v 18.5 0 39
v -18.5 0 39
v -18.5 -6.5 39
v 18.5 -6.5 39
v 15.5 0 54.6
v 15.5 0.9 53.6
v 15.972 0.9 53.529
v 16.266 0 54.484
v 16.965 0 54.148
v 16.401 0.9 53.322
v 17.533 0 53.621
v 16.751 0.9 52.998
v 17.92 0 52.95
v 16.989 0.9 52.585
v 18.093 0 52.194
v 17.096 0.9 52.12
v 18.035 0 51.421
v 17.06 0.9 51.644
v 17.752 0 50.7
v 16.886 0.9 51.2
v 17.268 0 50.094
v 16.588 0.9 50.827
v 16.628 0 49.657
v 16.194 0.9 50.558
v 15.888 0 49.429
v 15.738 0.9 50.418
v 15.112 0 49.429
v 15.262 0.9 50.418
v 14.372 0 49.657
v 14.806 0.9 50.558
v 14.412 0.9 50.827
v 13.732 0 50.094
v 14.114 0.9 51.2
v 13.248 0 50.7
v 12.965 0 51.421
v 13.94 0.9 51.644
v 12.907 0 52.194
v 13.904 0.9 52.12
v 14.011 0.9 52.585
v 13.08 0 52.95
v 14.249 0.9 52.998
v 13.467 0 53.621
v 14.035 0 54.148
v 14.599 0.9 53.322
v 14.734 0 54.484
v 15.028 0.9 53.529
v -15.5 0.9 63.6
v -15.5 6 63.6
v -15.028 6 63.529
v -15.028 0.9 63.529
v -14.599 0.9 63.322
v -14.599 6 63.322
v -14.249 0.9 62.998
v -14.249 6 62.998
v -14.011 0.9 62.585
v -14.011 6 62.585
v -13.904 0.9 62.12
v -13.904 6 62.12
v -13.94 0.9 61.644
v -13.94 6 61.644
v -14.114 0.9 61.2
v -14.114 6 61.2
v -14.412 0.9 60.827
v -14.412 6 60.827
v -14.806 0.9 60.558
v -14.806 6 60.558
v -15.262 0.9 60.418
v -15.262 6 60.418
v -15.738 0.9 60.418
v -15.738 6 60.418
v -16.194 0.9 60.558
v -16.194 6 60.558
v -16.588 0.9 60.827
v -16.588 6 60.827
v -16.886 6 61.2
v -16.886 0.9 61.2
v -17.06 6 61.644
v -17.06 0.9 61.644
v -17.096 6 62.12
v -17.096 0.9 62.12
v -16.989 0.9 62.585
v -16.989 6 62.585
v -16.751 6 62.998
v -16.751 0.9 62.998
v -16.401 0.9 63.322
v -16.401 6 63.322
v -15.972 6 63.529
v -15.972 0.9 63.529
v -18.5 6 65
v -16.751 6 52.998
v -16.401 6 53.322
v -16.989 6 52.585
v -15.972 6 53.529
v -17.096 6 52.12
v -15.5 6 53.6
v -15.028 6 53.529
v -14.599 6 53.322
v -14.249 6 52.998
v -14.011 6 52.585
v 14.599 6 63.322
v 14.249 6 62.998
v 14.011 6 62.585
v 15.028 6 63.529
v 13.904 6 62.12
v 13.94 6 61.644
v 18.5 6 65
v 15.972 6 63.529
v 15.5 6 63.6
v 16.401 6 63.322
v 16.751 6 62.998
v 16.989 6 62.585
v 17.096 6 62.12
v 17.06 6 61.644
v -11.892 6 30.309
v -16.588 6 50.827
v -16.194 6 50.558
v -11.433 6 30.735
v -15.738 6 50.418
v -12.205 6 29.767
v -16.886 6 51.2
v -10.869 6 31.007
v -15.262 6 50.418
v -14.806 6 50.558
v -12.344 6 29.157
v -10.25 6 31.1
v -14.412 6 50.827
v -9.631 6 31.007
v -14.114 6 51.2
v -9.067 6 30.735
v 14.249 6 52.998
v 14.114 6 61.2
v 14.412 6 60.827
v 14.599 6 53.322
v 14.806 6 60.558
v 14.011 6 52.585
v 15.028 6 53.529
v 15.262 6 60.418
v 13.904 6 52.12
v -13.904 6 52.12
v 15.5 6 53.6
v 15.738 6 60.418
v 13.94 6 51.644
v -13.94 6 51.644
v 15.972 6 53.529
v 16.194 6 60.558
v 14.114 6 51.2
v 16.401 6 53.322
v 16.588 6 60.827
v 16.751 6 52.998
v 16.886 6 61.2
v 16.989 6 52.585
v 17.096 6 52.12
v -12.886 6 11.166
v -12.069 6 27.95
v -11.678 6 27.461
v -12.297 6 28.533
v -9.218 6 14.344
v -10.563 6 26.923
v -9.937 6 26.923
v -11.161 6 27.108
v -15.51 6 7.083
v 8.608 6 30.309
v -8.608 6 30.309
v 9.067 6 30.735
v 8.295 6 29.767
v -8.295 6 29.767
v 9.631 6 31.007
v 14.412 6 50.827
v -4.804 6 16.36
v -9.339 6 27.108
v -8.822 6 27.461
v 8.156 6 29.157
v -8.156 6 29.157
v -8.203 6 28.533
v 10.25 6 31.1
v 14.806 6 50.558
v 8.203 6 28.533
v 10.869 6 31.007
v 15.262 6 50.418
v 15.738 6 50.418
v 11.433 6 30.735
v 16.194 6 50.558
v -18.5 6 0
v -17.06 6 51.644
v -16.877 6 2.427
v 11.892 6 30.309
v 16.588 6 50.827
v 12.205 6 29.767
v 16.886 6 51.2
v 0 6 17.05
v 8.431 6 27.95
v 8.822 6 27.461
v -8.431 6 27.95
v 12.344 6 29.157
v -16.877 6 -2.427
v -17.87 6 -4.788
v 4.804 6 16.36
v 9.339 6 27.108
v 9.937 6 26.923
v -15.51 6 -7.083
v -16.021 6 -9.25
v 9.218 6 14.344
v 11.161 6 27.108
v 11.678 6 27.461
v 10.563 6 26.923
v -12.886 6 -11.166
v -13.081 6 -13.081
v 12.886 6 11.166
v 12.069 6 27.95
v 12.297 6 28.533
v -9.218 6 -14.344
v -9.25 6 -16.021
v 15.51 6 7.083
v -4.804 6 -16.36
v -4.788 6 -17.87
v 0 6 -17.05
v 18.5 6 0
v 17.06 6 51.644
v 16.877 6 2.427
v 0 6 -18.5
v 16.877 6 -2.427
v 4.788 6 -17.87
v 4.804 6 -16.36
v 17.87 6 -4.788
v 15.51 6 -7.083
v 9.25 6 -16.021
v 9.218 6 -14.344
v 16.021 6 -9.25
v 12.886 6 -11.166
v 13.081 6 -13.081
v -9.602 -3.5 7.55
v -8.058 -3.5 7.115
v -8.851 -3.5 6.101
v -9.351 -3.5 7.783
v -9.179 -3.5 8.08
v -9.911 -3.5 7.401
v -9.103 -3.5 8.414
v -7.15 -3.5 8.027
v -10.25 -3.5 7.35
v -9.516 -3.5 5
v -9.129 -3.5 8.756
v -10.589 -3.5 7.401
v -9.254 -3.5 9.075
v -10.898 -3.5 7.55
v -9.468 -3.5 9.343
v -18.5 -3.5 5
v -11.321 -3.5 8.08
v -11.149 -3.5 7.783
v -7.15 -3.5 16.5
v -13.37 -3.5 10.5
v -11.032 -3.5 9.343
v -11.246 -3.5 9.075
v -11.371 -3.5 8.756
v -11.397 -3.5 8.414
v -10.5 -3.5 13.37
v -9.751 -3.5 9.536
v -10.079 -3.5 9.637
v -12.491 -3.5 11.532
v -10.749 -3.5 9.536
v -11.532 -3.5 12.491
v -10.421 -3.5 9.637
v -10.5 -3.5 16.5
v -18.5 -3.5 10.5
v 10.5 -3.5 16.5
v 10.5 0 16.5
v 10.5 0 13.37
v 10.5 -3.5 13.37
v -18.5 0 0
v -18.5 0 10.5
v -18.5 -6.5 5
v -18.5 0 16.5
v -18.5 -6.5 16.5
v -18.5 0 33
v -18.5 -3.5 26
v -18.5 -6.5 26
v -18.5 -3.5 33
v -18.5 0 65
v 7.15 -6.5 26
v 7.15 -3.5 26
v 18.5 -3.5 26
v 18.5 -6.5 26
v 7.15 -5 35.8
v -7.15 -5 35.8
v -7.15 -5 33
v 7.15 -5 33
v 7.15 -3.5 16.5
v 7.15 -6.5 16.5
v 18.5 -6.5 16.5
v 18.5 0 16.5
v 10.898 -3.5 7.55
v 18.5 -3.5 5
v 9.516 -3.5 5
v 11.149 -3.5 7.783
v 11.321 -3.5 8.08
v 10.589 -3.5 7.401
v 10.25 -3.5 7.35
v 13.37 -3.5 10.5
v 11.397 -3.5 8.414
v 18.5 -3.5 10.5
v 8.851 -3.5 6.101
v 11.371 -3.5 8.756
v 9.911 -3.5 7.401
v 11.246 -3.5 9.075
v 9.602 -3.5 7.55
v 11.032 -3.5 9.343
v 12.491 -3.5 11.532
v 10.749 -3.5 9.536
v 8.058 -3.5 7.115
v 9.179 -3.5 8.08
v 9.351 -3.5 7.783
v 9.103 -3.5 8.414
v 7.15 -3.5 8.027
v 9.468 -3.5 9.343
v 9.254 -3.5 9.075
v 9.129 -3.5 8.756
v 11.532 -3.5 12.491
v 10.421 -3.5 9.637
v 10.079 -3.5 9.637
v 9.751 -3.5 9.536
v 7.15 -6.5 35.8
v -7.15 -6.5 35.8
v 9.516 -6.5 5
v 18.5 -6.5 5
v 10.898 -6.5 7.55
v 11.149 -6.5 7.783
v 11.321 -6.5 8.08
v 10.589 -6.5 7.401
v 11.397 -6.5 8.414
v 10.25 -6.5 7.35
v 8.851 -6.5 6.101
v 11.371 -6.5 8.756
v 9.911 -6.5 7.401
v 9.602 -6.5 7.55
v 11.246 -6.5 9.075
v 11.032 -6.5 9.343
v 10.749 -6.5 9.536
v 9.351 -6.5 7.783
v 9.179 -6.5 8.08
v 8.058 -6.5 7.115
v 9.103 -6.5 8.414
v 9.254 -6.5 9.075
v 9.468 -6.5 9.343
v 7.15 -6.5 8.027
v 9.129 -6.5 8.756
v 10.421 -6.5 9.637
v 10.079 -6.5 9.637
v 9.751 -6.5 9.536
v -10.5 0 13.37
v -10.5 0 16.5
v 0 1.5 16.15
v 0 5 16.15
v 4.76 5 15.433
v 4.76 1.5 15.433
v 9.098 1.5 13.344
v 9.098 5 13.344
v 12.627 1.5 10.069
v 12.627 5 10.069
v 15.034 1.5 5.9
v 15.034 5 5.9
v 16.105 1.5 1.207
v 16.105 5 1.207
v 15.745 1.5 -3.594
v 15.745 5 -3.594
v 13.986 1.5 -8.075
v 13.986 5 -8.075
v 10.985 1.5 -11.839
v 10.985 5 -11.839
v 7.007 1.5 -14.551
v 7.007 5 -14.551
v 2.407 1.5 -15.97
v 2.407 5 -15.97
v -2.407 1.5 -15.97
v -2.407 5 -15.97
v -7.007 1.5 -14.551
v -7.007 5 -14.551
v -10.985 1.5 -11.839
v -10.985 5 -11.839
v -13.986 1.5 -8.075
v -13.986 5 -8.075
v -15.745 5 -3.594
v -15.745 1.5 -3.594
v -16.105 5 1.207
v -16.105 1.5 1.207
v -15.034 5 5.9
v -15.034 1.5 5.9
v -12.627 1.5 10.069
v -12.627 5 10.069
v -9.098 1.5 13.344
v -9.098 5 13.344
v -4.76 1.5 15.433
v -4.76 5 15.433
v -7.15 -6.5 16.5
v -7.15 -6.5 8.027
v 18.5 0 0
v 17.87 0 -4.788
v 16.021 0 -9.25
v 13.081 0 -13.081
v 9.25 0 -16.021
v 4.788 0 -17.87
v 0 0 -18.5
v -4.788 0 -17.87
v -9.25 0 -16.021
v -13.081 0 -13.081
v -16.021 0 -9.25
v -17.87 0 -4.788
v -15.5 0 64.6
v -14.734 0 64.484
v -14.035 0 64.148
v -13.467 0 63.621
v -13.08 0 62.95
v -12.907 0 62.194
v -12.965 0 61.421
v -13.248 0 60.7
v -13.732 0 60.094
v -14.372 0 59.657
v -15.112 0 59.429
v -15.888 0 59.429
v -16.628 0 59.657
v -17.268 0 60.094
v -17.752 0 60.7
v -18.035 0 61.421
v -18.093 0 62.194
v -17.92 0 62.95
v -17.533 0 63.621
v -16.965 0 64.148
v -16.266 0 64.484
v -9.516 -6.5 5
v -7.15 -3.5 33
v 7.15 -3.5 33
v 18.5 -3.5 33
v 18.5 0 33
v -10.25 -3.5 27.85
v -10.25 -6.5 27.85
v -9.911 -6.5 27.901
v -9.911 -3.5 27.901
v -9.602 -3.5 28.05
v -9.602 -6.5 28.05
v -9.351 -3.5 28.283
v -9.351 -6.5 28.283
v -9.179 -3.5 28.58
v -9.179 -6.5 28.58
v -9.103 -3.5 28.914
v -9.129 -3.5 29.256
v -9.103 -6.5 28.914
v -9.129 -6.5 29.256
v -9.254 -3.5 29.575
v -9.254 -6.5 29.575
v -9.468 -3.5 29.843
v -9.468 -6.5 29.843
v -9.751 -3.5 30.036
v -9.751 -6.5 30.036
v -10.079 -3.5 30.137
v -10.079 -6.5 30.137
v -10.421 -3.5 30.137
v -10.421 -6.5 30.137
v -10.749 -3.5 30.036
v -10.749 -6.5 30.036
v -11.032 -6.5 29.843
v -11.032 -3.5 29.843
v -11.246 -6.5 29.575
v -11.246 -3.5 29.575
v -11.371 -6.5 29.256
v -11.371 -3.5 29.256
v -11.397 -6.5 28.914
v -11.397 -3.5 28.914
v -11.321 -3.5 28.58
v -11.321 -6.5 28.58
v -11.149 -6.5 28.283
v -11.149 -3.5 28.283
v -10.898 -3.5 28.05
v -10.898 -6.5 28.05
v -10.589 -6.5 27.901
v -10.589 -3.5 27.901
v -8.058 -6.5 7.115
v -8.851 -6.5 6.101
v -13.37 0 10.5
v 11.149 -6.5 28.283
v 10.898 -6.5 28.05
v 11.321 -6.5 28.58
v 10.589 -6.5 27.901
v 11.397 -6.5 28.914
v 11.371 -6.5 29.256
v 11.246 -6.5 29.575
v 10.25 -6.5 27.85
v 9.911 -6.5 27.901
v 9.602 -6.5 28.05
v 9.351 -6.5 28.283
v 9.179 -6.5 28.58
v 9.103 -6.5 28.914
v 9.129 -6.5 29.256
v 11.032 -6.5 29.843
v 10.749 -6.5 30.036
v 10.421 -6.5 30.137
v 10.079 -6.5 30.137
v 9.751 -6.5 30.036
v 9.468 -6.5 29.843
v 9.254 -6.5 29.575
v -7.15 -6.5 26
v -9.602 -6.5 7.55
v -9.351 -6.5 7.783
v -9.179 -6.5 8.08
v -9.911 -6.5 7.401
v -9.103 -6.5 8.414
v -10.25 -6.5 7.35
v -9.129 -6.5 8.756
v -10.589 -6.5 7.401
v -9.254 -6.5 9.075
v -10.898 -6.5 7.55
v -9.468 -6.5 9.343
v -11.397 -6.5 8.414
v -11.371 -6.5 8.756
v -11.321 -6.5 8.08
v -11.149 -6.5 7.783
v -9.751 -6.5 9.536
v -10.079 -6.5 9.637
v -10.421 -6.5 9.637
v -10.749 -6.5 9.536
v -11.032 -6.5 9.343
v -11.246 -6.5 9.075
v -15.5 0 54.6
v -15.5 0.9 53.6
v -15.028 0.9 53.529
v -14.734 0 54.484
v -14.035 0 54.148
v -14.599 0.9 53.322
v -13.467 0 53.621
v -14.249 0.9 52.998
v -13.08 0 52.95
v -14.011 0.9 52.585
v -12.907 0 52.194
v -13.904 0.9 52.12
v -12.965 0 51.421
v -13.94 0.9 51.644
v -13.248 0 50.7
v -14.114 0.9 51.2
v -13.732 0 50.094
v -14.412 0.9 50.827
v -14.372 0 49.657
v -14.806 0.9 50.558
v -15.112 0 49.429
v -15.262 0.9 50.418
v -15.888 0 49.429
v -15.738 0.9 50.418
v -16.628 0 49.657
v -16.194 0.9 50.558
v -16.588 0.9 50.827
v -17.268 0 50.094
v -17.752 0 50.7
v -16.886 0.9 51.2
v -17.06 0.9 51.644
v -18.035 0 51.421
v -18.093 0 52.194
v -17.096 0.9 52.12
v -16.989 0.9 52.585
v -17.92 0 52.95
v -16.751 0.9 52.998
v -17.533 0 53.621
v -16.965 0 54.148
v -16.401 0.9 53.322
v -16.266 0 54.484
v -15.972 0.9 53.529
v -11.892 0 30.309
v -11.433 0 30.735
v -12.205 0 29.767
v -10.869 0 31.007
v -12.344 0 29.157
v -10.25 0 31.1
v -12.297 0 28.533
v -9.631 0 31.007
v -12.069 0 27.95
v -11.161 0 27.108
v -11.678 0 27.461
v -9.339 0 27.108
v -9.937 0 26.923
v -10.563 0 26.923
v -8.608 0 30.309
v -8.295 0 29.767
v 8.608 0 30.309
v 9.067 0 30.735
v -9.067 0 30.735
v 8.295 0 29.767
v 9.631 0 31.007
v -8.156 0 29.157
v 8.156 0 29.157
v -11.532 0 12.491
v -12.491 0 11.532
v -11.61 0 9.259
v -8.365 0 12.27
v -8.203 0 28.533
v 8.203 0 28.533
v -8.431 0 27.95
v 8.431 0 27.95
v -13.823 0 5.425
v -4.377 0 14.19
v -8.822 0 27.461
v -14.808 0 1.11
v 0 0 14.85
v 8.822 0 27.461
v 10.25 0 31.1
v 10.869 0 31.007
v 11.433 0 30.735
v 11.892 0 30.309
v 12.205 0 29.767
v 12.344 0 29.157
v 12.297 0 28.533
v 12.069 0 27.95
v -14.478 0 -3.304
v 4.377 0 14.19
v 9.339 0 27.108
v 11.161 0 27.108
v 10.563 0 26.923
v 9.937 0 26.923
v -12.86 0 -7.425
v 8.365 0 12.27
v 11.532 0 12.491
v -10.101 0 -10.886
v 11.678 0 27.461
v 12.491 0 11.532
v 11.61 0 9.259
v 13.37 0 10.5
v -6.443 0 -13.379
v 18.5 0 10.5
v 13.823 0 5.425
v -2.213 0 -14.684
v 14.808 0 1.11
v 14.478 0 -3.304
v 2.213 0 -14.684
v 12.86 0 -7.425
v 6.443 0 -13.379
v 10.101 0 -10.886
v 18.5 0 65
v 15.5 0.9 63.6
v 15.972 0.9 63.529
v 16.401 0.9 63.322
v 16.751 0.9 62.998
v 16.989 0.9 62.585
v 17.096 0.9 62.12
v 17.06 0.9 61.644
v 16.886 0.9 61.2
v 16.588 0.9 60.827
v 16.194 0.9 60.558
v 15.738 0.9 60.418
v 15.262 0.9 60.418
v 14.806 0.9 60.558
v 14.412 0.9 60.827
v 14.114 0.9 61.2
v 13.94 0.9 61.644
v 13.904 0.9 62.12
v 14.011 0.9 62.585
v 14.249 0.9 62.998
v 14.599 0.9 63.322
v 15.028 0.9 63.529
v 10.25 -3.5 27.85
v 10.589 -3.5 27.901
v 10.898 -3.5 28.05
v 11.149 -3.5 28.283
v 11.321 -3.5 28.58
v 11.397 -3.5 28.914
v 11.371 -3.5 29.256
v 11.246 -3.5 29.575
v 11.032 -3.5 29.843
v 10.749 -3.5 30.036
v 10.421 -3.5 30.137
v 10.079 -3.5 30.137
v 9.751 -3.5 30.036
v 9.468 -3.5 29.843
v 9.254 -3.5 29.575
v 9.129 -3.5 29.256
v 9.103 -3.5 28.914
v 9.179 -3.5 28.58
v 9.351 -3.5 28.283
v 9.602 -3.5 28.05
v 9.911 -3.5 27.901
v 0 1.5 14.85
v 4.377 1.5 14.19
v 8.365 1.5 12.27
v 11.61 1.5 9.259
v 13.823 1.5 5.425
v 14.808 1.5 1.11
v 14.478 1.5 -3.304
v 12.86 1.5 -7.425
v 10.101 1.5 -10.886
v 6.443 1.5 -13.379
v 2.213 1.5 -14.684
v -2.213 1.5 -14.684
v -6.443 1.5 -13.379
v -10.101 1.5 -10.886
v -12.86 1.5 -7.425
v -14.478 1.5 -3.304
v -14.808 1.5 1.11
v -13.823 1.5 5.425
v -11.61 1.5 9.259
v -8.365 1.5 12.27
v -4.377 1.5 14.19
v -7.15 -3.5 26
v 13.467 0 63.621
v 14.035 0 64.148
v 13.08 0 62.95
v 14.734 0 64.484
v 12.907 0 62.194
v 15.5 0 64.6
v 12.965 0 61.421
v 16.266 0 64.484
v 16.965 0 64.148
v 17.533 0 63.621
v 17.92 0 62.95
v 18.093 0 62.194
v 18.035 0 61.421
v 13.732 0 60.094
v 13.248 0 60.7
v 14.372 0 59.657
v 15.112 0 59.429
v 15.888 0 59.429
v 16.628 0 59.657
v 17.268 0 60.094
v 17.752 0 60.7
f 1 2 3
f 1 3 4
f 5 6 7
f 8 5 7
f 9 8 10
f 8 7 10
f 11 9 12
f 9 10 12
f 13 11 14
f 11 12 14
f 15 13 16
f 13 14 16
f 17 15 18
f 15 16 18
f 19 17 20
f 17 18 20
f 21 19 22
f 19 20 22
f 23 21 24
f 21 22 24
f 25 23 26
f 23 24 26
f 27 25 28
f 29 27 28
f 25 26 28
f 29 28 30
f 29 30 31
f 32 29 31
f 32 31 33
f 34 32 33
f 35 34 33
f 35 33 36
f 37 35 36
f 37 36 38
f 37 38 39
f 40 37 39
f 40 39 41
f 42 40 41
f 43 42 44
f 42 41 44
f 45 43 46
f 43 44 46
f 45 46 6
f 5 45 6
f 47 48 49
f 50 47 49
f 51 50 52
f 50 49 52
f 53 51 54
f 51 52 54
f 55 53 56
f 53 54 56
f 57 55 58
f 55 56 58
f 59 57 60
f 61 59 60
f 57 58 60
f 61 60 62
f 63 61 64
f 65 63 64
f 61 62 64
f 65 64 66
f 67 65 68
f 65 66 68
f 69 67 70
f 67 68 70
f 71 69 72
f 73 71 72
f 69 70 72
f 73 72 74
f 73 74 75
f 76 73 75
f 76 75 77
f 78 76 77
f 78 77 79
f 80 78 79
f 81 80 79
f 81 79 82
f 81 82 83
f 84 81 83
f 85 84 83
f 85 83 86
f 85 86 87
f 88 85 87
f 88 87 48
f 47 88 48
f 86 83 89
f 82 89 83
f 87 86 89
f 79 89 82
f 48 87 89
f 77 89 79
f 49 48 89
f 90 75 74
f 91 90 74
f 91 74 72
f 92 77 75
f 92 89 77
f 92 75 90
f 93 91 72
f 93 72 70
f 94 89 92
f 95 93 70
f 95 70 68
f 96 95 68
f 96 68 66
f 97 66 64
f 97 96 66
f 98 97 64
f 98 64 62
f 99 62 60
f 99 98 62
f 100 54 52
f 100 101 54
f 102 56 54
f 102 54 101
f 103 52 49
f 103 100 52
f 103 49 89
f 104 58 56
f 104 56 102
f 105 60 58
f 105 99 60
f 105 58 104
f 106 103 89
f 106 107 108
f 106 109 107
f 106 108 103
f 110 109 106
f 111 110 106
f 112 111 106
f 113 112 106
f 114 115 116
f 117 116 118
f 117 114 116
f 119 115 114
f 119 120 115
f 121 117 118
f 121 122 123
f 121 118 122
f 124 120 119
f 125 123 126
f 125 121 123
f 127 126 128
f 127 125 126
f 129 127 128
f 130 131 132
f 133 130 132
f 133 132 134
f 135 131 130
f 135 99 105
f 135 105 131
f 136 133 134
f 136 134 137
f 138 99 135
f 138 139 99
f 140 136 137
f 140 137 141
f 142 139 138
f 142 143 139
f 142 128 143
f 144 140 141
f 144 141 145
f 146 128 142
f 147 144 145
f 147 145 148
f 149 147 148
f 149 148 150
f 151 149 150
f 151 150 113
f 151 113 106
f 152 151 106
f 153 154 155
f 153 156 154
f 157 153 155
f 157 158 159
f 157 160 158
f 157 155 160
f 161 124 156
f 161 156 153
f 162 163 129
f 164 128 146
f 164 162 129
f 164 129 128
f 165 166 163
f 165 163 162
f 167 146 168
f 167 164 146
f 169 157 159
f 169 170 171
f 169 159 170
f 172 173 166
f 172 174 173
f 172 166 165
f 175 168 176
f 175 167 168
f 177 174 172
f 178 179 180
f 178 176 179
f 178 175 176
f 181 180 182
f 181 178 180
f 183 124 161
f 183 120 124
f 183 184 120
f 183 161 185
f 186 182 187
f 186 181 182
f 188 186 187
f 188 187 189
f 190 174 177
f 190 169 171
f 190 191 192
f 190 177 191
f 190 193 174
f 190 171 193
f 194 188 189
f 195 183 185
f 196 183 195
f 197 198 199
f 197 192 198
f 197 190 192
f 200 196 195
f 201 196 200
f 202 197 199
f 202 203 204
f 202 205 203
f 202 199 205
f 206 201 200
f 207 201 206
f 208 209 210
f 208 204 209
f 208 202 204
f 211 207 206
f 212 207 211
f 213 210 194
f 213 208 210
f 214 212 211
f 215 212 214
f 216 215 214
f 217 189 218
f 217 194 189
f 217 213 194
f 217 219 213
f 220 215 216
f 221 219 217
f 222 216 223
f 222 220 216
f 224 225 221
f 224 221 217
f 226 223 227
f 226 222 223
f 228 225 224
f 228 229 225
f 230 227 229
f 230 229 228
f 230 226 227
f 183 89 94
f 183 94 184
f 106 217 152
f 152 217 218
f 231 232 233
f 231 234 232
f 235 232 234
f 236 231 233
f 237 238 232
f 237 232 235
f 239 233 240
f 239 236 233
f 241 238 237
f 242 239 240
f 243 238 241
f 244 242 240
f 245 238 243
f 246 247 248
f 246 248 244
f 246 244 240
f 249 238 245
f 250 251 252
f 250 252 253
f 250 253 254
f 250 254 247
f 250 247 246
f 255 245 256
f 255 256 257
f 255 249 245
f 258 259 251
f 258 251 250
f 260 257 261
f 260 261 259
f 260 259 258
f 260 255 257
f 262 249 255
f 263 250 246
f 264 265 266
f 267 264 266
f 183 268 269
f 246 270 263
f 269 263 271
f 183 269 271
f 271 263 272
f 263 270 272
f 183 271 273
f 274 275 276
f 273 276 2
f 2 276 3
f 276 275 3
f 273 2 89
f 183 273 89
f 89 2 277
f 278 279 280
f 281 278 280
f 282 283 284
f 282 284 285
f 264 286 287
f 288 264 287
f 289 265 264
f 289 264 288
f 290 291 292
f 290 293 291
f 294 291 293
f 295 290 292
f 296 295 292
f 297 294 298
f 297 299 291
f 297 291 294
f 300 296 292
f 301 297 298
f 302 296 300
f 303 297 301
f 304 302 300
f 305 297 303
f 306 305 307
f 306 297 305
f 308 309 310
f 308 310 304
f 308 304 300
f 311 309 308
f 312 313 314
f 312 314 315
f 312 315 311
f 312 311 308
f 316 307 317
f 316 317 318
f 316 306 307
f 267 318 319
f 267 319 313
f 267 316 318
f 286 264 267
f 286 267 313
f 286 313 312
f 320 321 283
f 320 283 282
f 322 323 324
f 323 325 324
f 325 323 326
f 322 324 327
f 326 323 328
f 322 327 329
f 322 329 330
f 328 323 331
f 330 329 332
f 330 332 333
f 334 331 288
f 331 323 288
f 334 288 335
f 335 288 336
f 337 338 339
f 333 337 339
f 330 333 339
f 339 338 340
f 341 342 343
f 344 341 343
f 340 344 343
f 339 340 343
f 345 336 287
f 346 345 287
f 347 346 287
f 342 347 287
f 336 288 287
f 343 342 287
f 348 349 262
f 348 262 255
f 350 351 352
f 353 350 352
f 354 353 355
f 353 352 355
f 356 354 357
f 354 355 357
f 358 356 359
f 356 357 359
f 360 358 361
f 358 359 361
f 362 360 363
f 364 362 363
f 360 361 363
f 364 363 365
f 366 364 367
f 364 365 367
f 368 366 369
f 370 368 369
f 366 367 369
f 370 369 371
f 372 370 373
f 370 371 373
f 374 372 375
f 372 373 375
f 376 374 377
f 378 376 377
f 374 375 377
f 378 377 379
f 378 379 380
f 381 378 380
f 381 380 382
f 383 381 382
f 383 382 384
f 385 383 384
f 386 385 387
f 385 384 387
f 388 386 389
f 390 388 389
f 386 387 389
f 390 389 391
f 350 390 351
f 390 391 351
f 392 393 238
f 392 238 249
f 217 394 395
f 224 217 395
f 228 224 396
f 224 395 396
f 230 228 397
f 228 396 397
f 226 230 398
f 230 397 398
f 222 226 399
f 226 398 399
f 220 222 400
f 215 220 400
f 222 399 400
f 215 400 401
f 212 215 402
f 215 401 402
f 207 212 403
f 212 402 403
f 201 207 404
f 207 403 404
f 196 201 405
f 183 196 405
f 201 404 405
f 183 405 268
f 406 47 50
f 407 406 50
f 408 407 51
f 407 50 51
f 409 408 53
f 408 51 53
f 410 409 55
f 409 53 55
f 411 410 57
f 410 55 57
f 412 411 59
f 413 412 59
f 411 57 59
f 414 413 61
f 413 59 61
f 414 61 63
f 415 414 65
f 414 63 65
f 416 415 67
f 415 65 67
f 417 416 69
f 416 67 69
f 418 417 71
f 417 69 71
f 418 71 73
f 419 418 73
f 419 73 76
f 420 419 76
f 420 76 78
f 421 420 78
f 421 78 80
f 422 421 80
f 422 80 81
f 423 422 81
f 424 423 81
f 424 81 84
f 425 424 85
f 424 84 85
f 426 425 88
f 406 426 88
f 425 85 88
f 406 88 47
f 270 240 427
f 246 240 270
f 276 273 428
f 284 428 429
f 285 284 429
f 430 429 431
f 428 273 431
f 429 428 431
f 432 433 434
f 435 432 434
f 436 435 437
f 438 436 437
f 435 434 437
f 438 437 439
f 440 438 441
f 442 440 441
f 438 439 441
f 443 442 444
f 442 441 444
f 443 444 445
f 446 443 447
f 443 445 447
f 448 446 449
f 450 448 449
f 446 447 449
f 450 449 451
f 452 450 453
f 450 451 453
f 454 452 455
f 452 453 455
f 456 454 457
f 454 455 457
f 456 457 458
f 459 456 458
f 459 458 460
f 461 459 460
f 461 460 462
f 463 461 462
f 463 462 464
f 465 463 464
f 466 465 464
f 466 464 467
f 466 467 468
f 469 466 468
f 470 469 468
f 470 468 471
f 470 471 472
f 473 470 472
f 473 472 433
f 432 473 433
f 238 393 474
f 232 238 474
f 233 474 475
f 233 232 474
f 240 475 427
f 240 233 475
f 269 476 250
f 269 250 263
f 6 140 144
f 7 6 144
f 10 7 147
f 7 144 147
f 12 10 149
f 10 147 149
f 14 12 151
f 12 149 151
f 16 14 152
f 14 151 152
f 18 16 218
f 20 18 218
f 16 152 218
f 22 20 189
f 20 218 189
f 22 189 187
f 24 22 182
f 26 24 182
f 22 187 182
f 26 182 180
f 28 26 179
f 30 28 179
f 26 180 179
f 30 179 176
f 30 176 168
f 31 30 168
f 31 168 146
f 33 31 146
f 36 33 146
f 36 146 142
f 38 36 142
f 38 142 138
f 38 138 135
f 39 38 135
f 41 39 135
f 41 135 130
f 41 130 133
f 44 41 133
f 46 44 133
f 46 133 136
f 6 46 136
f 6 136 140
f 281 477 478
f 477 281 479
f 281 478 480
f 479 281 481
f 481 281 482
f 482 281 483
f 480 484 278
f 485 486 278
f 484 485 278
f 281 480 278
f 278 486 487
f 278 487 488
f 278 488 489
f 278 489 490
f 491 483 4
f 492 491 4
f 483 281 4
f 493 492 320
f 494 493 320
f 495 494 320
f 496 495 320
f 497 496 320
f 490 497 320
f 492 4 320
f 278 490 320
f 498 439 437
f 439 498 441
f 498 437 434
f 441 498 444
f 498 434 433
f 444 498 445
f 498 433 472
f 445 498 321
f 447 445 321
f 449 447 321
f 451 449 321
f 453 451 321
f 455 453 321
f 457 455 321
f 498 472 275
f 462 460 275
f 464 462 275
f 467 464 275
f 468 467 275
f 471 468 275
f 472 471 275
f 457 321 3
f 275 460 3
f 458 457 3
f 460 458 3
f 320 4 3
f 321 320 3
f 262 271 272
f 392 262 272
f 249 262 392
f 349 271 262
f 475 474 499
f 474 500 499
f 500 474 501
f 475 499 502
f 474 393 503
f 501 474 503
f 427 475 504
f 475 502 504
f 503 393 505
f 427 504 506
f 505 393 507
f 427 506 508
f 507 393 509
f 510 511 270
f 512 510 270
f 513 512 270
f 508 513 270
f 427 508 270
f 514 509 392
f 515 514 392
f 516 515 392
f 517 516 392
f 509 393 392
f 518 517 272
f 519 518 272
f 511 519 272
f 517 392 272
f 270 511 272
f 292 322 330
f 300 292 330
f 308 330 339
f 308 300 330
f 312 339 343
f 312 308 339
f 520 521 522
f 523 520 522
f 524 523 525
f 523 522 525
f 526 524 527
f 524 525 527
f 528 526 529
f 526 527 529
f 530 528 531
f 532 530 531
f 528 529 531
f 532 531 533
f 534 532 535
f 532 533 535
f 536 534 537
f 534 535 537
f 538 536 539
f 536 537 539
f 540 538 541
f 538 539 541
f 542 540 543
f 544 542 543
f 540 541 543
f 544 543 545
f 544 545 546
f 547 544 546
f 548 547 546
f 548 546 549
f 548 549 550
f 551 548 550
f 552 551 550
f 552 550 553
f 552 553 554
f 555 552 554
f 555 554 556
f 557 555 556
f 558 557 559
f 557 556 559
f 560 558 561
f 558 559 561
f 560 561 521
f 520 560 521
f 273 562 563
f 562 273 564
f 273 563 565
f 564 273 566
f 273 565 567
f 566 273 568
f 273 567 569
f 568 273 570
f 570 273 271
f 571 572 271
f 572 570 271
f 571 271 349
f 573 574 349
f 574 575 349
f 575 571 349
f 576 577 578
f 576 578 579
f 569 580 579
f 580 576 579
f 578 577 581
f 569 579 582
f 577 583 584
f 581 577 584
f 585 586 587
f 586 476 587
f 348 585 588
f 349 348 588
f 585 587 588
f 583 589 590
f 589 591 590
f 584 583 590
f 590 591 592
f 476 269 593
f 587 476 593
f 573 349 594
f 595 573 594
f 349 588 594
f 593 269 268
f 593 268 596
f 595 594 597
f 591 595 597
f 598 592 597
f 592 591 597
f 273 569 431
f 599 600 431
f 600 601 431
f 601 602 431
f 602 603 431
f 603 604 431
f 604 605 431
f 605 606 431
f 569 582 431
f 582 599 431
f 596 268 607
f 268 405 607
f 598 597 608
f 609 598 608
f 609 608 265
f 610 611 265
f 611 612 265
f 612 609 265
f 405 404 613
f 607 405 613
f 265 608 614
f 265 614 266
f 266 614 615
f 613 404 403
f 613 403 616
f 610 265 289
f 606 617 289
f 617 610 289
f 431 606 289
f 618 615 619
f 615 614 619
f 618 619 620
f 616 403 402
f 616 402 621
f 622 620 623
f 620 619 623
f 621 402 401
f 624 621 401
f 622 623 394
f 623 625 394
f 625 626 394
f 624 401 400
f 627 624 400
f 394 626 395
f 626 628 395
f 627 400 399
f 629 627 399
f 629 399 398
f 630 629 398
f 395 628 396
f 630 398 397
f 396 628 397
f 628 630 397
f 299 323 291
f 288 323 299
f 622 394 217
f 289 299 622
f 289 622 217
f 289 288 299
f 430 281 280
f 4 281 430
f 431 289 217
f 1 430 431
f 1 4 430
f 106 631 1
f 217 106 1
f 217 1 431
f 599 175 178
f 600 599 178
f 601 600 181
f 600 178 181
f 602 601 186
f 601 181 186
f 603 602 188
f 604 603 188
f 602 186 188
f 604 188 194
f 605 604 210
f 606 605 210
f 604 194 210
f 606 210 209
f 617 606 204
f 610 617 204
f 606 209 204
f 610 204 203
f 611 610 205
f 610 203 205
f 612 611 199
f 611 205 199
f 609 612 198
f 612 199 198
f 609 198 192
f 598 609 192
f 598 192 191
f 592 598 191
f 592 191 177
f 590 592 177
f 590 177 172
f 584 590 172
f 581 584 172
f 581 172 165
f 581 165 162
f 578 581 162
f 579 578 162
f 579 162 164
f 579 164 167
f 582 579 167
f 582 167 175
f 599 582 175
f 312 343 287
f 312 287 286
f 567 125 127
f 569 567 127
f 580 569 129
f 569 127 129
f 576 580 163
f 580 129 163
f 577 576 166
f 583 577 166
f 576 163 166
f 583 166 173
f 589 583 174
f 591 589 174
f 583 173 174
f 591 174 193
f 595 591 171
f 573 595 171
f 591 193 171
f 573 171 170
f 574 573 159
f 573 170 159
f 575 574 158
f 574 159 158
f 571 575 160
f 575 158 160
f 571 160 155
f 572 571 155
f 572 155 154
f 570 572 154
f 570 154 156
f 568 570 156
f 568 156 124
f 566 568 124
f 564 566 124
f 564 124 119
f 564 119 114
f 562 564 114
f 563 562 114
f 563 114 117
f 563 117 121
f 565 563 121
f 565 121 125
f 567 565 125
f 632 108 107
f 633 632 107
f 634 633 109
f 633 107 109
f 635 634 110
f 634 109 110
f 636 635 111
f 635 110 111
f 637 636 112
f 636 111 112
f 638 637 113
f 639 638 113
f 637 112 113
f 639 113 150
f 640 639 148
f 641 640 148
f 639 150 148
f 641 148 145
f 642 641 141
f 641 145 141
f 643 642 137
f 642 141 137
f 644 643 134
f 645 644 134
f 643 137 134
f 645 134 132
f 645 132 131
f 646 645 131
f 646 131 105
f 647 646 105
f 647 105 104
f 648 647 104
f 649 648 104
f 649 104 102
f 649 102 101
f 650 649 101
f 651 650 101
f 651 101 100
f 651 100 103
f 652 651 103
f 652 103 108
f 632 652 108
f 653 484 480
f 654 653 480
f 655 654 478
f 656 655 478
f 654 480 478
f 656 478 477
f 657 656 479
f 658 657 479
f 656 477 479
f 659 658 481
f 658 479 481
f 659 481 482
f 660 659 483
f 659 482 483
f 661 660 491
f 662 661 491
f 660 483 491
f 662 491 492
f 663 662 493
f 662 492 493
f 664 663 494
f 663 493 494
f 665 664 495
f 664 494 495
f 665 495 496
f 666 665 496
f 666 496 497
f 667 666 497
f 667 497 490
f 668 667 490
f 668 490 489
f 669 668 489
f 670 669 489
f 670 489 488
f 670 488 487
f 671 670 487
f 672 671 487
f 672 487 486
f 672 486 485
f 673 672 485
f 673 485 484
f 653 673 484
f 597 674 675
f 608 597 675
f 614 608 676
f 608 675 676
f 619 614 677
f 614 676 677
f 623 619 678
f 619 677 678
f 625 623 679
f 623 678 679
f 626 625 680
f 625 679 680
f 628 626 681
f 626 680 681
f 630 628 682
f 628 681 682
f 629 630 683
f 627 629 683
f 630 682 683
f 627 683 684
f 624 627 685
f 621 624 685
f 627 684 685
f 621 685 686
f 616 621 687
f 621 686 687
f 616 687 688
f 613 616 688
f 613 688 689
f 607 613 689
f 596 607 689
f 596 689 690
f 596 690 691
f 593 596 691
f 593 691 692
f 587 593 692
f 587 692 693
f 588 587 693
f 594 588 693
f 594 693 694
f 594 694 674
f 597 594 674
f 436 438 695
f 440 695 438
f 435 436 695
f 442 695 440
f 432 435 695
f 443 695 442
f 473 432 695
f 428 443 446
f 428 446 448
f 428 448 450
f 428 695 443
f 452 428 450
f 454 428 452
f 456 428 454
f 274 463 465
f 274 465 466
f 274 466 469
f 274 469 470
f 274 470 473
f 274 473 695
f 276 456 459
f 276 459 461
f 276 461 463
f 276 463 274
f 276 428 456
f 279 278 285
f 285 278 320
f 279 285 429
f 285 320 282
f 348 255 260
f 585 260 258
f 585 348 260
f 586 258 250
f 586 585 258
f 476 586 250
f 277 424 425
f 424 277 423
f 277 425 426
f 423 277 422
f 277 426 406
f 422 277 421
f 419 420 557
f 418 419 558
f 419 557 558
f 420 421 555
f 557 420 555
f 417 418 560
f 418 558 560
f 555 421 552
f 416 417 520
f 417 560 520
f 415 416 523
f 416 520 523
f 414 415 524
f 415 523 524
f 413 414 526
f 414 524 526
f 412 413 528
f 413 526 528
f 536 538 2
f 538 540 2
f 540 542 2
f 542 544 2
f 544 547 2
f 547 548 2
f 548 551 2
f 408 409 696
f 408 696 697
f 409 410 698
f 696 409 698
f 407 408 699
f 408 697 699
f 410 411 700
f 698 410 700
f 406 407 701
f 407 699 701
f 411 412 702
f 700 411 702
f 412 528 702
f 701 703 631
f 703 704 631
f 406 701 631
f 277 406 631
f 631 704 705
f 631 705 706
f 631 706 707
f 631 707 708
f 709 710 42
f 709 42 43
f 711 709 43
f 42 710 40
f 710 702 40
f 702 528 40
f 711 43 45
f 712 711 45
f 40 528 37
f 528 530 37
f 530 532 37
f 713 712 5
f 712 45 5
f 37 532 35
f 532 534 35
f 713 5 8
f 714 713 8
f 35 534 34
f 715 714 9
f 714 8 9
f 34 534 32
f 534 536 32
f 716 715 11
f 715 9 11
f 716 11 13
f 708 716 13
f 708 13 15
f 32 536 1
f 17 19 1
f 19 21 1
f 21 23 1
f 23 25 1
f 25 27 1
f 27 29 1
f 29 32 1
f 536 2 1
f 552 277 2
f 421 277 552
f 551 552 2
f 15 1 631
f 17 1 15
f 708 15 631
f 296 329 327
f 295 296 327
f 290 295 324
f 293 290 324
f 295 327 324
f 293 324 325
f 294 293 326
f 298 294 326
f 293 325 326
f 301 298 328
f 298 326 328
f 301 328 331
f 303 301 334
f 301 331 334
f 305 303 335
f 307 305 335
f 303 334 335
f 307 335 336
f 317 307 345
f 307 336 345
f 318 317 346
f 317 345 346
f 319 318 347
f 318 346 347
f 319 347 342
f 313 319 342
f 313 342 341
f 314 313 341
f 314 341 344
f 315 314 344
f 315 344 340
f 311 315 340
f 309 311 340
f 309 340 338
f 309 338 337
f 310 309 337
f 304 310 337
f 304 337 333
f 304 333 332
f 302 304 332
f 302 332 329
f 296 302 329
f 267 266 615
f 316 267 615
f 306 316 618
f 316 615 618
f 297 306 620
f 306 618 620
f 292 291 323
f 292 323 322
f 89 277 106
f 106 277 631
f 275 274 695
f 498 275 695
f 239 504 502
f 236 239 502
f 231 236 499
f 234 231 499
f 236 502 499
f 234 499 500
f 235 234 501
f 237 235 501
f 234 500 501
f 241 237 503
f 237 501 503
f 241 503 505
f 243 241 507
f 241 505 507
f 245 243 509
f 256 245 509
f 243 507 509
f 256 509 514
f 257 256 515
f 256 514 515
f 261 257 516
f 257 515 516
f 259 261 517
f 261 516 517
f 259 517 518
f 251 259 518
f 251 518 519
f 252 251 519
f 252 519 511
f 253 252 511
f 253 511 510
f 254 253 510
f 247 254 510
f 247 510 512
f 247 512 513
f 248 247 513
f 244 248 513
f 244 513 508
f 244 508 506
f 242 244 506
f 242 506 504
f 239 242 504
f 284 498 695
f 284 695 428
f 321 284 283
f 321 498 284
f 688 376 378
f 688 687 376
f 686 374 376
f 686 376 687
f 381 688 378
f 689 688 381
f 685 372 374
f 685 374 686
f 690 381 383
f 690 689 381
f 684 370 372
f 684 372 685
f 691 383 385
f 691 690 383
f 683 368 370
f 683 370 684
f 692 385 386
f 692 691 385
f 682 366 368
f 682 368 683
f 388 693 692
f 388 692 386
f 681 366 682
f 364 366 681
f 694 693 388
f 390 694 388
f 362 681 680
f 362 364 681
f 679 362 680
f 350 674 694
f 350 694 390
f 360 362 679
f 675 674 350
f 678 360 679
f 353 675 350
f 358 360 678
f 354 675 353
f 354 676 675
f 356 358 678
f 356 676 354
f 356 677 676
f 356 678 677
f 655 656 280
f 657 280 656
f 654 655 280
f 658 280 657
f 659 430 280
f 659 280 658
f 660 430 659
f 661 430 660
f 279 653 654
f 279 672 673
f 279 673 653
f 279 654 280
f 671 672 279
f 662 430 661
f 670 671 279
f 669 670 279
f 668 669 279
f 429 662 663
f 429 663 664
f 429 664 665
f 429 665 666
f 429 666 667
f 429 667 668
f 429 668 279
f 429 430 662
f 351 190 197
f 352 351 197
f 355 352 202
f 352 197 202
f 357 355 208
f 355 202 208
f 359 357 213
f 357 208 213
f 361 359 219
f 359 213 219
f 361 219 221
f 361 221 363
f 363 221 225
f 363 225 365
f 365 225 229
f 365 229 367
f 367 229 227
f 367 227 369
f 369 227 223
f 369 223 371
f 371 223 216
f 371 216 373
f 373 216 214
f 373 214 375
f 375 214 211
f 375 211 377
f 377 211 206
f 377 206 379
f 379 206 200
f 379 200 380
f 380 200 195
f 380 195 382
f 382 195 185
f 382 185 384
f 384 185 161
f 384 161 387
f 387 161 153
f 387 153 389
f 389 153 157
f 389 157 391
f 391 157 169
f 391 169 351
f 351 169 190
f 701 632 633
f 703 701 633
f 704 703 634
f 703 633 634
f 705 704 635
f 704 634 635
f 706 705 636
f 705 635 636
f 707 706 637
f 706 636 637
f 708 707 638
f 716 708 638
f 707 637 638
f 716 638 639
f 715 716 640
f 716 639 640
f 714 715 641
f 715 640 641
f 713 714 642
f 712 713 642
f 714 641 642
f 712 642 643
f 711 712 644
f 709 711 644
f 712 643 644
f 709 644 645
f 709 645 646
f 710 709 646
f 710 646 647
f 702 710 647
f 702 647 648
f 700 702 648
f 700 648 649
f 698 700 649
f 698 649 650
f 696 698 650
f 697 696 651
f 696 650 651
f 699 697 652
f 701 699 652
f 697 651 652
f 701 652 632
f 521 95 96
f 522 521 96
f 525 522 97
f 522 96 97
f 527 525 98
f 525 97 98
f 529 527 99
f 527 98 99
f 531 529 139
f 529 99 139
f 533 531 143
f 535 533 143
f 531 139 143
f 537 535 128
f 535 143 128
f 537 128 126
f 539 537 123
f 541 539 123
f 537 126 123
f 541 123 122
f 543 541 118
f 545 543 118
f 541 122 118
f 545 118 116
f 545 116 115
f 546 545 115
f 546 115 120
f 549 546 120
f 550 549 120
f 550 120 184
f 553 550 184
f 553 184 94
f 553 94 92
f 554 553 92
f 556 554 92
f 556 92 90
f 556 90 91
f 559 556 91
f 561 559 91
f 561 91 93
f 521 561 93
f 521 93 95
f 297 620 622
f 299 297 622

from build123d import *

# Parameters (mm, degrees)
EXTRUDE_1_DEPTH     = 6
SKETCH_2_R          = 16.15
CUT_EXTRUDE_1_DEPTH = 4.5
SKETCH_3_R          = 14.85
CUT_EXTRUDE_2_DEPTH = 68.731085921
CHAMFER_1_SIZE      = 1
CHAMFER_1_SIZE2     = 0.900404044
SKETCH_4_W          = 37
SKETCH_4_H          = 6
EXTRUDE_2_DEPTH     = 6.5
SKETCH_5_W          = 14.3
SKETCH_5_H          = 2.8
CUT_EXTRUDE_3_DEPTH = 1.5
SKETCH_6_W          = 11.35
SKETCH_6_H          = 3
EXTRUDE_3_DEPTH     = 28
SKETCH_7_R          = 1.15
CUT_EXTRUDE_4_DEPTH = 69.727723664
CUT_EXTRUDE_5_REACH = 70.728
SKETCH_8_R          = 2.1
CUT_EXTRUDE_START   = -3
SKETCH_9_R          = 10.75
SKETCH_9_W          = 37
SKETCH_9_H          = 9.5
CUT_EXTRUDE_6_DEPTH = 3
CUT_EXTRUDE_7_REACH = 70.728
SKETCH_10_R         = 1.6
CHAMFER_2_SIZE      = 1
CHAMFER_2_SIZE2     = 0.900404044


with BuildPart() as part:
    # 스케치1 → 보스-돌출1 (new body)
    with BuildSketch(Plane(origin=(0, 0, 0), x_dir=(1, 0, 0), z_dir=(0, 1, 0))):
        with BuildLine():
            Line((-18.5, 0), (-18.5, -65))
            Line((-18.5, -65), (18.5, -65))
            Line((18.5, -65), (18.5, 0))
            ThreePointArc((18.5, 0), (0, 18.5), (-18.5, 0))
        make_face()
    extrude(amount=EXTRUDE_1_DEPTH)

    # 스케치2 → 컷-돌출1 (cut)
    with BuildSketch(Plane(origin=(0, 6, 0), x_dir=(1, 0, 0), z_dir=(0, 1, 0))):
        with Locations(Location((0, 0, 0), (0, 0, 270))):
            Circle(SKETCH_2_R)
    extrude(amount=-CUT_EXTRUDE_1_DEPTH, mode=Mode.SUBTRACT)

    # 스케치3 → 컷-돌출2 (cut, through all)
    with BuildSketch(Plane(origin=(0, 1.5, 0), x_dir=(1, 0, 0), z_dir=(0, 1, 0))):
        with Locations(Location((0, 0, 0), (0, 0, 270))):
            Circle(SKETCH_3_R)
    extrude(amount=-CUT_EXTRUDE_2_DEPTH, mode=Mode.SUBTRACT)

    # 모따기1
    chamfer_1_edges = [part.edges().sort_by_distance(p)[0] for p in [
        (0, 6, -16.15),
    ]]
    chamfer_1_side = [part.faces().sort_by_distance(p)[0] for p in [
        (0, 3.75, -16.15),
    ]]
    chamfer(chamfer_1_edges, length=CHAMFER_1_SIZE, length2=CHAMFER_1_SIZE2, reference=chamfer_1_side[0])

    # 스케치4 → 보스-돌출2 (add)
    with BuildSketch(Plane.XZ):
        with Locations((0, 36)):
            Rectangle(SKETCH_4_W, SKETCH_4_H)
        with BuildLine():
            Line((-18.5, 16.5), (-10.5, 16.5))
            Line((-10.5, 16.5), (-10.5, 13.369741957))
            ThreePointArc((-10.5, 13.369741957), (-12.02081528, 12.02081528), (-13.369741957, 10.5))
            Line((-13.369741957, 10.5), (-18.5, 10.5))
            Line((-18.5, 10.5), (-18.5, 16.5))
        make_face()
        with BuildLine():
            Line((18.5, 16.5), (10.5, 16.5))
            Line((10.5, 16.5), (10.5, 13.369741957))
            ThreePointArc((10.5, 13.369741957), (12.02081528, 12.02081528), (13.369741957, 10.5))
            Line((13.369741957, 10.5), (18.5, 10.5))
            Line((18.5, 10.5), (18.5, 16.5))
        make_face()
    extrude(amount=EXTRUDE_2_DEPTH)

    # 스케치5 → 컷-돌출3 (cut)
    with BuildSketch(Plane.XZ.offset(6.5)):
        with Locations((0, 34.4)):
            Rectangle(SKETCH_5_W, SKETCH_5_H)
    extrude(amount=-CUT_EXTRUDE_3_DEPTH, mode=Mode.SUBTRACT)

    # 스케치6 → 보스-돌출3 (add)
    with BuildSketch(Plane(origin=(0, 0, 33), x_dir=(-1, 0, 0), z_dir=(0, 0, -1))):
        with Locations((-12.825, -5)):
            Rectangle(SKETCH_6_W, SKETCH_6_H)
        with Locations((12.825, -5)):
            Rectangle(SKETCH_6_W, SKETCH_6_H)
    extrude(amount=EXTRUDE_3_DEPTH)

    # 스케치7 → 컷-돌출4 (cut, through all)
    with BuildSketch(Plane.XZ.offset(6.5)):
        with Locations(Location((-10.25, 29, 0), (0, 0, 270))):
            Circle(SKETCH_7_R)
        with Locations(Location((10.25, 29, 0), (0, 0, 270))):
            Circle(SKETCH_7_R)
        with Locations(Location((-10.25, 8.5, 0), (0, 0, 270))):
            Circle(SKETCH_7_R)
        with Locations(Location((10.25, 8.5, 0), (0, 0, 270))):
            Circle(SKETCH_7_R)
    extrude(amount=-CUT_EXTRUDE_4_DEPTH, mode=Mode.SUBTRACT)

    # 스케치8 → 컷-돌출5 (cut, up to next)
    with BuildSketch(Plane(origin=(0, 6, 0), x_dir=(1, 0, 0), z_dir=(0, 1, 0)), mode=Mode.PRIVATE) as cut_extrude_5_sk1:
        with Locations(Location((-10.25, -29, 0), (0, 0, 270))):
            Circle(SKETCH_8_R)
    cut_extrude_5_tool1 = extrude(cut_extrude_5_sk1.sketch, amount=-CUT_EXTRUDE_5_REACH, mode=Mode.PRIVATE) & part.part
    # 스케치8 → 컷-돌출5 (cut, up to next)
    with BuildSketch(Plane(origin=(0, 6, 0), x_dir=(1, 0, 0), z_dir=(0, 1, 0)), mode=Mode.PRIVATE) as cut_extrude_5_sk2:
        with Locations(Location((10.25, -29, 0), (0, 0, 270))):
            Circle(SKETCH_8_R)
    cut_extrude_5_tool2 = extrude(cut_extrude_5_sk2.sketch, amount=-CUT_EXTRUDE_5_REACH, mode=Mode.PRIVATE) & part.part
    add(cut_extrude_5_tool1.solids().sort_by_distance((-10.25, 6, 29))[0], mode=Mode.SUBTRACT)
    add(cut_extrude_5_tool2.solids().sort_by_distance((10.25, 6, 29))[0], mode=Mode.SUBTRACT)

    # 스케치9 → 컷-돌출6 (cut)
    with BuildSketch(Plane.XZ.offset(6.5).offset(CUT_EXTRUDE_START)):
        Circle(SKETCH_9_R)
        with Locations((0, 21.25)):
            Rectangle(SKETCH_9_W, SKETCH_9_H)
    extrude(amount=CUT_EXTRUDE_6_DEPTH, mode=Mode.SUBTRACT)

    # 스케치10 → 컷-돌출7 (cut, up to next)
    with BuildSketch(Plane(origin=(0, 6, 0), x_dir=(1, 0, 0), z_dir=(0, 1, 0)), mode=Mode.PRIVATE) as cut_extrude_7_sk1:
        with Locations(Location((-15.5, -52, 0), (0, 0, 270))):
            Circle(SKETCH_10_R)
    cut_extrude_7_tool1 = extrude(cut_extrude_7_sk1.sketch, amount=-CUT_EXTRUDE_7_REACH, mode=Mode.PRIVATE) & part.part
    # 스케치10 → 컷-돌출7 (cut, up to next)
    with BuildSketch(Plane(origin=(0, 6, 0), x_dir=(1, 0, 0), z_dir=(0, 1, 0)), mode=Mode.PRIVATE) as cut_extrude_7_sk2:
        with Locations(Location((15.5, -52, 0), (0, 0, 270))):
            Circle(SKETCH_10_R)
    cut_extrude_7_tool2 = extrude(cut_extrude_7_sk2.sketch, amount=-CUT_EXTRUDE_7_REACH, mode=Mode.PRIVATE) & part.part
    # 스케치10 → 컷-돌출7 (cut, up to next)
    with BuildSketch(Plane(origin=(0, 6, 0), x_dir=(1, 0, 0), z_dir=(0, 1, 0)), mode=Mode.PRIVATE) as cut_extrude_7_sk3:
        with Locations(Location((15.5, -62, 0), (0, 0, 270))):
            Circle(SKETCH_10_R)
    cut_extrude_7_tool3 = extrude(cut_extrude_7_sk3.sketch, amount=-CUT_EXTRUDE_7_REACH, mode=Mode.PRIVATE) & part.part
    # 스케치10 → 컷-돌출7 (cut, up to next)
    with BuildSketch(Plane(origin=(0, 6, 0), x_dir=(1, 0, 0), z_dir=(0, 1, 0)), mode=Mode.PRIVATE) as cut_extrude_7_sk4:
        with Locations(Location((-15.5, -62, 0), (0, 0, 270))):
            Circle(SKETCH_10_R)
    cut_extrude_7_tool4 = extrude(cut_extrude_7_sk4.sketch, amount=-CUT_EXTRUDE_7_REACH, mode=Mode.PRIVATE) & part.part
    add(cut_extrude_7_tool1.solids().sort_by_distance((-15.5, 6, 52))[0], mode=Mode.SUBTRACT)
    add(cut_extrude_7_tool2.solids().sort_by_distance((15.5, 6, 52))[0], mode=Mode.SUBTRACT)
    add(cut_extrude_7_tool3.solids().sort_by_distance((15.5, 6, 62))[0], mode=Mode.SUBTRACT)
    add(cut_extrude_7_tool4.solids().sort_by_distance((-15.5, 6, 62))[0], mode=Mode.SUBTRACT)

    # 모따기2
    chamfer_2_edges = [part.edges().sort_by_distance(p)[0] for p in [
        (-15.5, 0, 60.4),
        (15.5, 0, 60.4),
        (15.5, 0, 50.4),
        (-15.5, 0, 50.4),
    ]]
    chamfer_2_side = [part.faces().sort_by_distance(p)[0] for p in [
        (0, 0, 51.827011897),
    ]]
    chamfer(chamfer_2_edges, length=CHAMFER_2_SIZE, length2=CHAMFER_2_SIZE2, reference=chamfer_2_side[0])


solid = part.part
